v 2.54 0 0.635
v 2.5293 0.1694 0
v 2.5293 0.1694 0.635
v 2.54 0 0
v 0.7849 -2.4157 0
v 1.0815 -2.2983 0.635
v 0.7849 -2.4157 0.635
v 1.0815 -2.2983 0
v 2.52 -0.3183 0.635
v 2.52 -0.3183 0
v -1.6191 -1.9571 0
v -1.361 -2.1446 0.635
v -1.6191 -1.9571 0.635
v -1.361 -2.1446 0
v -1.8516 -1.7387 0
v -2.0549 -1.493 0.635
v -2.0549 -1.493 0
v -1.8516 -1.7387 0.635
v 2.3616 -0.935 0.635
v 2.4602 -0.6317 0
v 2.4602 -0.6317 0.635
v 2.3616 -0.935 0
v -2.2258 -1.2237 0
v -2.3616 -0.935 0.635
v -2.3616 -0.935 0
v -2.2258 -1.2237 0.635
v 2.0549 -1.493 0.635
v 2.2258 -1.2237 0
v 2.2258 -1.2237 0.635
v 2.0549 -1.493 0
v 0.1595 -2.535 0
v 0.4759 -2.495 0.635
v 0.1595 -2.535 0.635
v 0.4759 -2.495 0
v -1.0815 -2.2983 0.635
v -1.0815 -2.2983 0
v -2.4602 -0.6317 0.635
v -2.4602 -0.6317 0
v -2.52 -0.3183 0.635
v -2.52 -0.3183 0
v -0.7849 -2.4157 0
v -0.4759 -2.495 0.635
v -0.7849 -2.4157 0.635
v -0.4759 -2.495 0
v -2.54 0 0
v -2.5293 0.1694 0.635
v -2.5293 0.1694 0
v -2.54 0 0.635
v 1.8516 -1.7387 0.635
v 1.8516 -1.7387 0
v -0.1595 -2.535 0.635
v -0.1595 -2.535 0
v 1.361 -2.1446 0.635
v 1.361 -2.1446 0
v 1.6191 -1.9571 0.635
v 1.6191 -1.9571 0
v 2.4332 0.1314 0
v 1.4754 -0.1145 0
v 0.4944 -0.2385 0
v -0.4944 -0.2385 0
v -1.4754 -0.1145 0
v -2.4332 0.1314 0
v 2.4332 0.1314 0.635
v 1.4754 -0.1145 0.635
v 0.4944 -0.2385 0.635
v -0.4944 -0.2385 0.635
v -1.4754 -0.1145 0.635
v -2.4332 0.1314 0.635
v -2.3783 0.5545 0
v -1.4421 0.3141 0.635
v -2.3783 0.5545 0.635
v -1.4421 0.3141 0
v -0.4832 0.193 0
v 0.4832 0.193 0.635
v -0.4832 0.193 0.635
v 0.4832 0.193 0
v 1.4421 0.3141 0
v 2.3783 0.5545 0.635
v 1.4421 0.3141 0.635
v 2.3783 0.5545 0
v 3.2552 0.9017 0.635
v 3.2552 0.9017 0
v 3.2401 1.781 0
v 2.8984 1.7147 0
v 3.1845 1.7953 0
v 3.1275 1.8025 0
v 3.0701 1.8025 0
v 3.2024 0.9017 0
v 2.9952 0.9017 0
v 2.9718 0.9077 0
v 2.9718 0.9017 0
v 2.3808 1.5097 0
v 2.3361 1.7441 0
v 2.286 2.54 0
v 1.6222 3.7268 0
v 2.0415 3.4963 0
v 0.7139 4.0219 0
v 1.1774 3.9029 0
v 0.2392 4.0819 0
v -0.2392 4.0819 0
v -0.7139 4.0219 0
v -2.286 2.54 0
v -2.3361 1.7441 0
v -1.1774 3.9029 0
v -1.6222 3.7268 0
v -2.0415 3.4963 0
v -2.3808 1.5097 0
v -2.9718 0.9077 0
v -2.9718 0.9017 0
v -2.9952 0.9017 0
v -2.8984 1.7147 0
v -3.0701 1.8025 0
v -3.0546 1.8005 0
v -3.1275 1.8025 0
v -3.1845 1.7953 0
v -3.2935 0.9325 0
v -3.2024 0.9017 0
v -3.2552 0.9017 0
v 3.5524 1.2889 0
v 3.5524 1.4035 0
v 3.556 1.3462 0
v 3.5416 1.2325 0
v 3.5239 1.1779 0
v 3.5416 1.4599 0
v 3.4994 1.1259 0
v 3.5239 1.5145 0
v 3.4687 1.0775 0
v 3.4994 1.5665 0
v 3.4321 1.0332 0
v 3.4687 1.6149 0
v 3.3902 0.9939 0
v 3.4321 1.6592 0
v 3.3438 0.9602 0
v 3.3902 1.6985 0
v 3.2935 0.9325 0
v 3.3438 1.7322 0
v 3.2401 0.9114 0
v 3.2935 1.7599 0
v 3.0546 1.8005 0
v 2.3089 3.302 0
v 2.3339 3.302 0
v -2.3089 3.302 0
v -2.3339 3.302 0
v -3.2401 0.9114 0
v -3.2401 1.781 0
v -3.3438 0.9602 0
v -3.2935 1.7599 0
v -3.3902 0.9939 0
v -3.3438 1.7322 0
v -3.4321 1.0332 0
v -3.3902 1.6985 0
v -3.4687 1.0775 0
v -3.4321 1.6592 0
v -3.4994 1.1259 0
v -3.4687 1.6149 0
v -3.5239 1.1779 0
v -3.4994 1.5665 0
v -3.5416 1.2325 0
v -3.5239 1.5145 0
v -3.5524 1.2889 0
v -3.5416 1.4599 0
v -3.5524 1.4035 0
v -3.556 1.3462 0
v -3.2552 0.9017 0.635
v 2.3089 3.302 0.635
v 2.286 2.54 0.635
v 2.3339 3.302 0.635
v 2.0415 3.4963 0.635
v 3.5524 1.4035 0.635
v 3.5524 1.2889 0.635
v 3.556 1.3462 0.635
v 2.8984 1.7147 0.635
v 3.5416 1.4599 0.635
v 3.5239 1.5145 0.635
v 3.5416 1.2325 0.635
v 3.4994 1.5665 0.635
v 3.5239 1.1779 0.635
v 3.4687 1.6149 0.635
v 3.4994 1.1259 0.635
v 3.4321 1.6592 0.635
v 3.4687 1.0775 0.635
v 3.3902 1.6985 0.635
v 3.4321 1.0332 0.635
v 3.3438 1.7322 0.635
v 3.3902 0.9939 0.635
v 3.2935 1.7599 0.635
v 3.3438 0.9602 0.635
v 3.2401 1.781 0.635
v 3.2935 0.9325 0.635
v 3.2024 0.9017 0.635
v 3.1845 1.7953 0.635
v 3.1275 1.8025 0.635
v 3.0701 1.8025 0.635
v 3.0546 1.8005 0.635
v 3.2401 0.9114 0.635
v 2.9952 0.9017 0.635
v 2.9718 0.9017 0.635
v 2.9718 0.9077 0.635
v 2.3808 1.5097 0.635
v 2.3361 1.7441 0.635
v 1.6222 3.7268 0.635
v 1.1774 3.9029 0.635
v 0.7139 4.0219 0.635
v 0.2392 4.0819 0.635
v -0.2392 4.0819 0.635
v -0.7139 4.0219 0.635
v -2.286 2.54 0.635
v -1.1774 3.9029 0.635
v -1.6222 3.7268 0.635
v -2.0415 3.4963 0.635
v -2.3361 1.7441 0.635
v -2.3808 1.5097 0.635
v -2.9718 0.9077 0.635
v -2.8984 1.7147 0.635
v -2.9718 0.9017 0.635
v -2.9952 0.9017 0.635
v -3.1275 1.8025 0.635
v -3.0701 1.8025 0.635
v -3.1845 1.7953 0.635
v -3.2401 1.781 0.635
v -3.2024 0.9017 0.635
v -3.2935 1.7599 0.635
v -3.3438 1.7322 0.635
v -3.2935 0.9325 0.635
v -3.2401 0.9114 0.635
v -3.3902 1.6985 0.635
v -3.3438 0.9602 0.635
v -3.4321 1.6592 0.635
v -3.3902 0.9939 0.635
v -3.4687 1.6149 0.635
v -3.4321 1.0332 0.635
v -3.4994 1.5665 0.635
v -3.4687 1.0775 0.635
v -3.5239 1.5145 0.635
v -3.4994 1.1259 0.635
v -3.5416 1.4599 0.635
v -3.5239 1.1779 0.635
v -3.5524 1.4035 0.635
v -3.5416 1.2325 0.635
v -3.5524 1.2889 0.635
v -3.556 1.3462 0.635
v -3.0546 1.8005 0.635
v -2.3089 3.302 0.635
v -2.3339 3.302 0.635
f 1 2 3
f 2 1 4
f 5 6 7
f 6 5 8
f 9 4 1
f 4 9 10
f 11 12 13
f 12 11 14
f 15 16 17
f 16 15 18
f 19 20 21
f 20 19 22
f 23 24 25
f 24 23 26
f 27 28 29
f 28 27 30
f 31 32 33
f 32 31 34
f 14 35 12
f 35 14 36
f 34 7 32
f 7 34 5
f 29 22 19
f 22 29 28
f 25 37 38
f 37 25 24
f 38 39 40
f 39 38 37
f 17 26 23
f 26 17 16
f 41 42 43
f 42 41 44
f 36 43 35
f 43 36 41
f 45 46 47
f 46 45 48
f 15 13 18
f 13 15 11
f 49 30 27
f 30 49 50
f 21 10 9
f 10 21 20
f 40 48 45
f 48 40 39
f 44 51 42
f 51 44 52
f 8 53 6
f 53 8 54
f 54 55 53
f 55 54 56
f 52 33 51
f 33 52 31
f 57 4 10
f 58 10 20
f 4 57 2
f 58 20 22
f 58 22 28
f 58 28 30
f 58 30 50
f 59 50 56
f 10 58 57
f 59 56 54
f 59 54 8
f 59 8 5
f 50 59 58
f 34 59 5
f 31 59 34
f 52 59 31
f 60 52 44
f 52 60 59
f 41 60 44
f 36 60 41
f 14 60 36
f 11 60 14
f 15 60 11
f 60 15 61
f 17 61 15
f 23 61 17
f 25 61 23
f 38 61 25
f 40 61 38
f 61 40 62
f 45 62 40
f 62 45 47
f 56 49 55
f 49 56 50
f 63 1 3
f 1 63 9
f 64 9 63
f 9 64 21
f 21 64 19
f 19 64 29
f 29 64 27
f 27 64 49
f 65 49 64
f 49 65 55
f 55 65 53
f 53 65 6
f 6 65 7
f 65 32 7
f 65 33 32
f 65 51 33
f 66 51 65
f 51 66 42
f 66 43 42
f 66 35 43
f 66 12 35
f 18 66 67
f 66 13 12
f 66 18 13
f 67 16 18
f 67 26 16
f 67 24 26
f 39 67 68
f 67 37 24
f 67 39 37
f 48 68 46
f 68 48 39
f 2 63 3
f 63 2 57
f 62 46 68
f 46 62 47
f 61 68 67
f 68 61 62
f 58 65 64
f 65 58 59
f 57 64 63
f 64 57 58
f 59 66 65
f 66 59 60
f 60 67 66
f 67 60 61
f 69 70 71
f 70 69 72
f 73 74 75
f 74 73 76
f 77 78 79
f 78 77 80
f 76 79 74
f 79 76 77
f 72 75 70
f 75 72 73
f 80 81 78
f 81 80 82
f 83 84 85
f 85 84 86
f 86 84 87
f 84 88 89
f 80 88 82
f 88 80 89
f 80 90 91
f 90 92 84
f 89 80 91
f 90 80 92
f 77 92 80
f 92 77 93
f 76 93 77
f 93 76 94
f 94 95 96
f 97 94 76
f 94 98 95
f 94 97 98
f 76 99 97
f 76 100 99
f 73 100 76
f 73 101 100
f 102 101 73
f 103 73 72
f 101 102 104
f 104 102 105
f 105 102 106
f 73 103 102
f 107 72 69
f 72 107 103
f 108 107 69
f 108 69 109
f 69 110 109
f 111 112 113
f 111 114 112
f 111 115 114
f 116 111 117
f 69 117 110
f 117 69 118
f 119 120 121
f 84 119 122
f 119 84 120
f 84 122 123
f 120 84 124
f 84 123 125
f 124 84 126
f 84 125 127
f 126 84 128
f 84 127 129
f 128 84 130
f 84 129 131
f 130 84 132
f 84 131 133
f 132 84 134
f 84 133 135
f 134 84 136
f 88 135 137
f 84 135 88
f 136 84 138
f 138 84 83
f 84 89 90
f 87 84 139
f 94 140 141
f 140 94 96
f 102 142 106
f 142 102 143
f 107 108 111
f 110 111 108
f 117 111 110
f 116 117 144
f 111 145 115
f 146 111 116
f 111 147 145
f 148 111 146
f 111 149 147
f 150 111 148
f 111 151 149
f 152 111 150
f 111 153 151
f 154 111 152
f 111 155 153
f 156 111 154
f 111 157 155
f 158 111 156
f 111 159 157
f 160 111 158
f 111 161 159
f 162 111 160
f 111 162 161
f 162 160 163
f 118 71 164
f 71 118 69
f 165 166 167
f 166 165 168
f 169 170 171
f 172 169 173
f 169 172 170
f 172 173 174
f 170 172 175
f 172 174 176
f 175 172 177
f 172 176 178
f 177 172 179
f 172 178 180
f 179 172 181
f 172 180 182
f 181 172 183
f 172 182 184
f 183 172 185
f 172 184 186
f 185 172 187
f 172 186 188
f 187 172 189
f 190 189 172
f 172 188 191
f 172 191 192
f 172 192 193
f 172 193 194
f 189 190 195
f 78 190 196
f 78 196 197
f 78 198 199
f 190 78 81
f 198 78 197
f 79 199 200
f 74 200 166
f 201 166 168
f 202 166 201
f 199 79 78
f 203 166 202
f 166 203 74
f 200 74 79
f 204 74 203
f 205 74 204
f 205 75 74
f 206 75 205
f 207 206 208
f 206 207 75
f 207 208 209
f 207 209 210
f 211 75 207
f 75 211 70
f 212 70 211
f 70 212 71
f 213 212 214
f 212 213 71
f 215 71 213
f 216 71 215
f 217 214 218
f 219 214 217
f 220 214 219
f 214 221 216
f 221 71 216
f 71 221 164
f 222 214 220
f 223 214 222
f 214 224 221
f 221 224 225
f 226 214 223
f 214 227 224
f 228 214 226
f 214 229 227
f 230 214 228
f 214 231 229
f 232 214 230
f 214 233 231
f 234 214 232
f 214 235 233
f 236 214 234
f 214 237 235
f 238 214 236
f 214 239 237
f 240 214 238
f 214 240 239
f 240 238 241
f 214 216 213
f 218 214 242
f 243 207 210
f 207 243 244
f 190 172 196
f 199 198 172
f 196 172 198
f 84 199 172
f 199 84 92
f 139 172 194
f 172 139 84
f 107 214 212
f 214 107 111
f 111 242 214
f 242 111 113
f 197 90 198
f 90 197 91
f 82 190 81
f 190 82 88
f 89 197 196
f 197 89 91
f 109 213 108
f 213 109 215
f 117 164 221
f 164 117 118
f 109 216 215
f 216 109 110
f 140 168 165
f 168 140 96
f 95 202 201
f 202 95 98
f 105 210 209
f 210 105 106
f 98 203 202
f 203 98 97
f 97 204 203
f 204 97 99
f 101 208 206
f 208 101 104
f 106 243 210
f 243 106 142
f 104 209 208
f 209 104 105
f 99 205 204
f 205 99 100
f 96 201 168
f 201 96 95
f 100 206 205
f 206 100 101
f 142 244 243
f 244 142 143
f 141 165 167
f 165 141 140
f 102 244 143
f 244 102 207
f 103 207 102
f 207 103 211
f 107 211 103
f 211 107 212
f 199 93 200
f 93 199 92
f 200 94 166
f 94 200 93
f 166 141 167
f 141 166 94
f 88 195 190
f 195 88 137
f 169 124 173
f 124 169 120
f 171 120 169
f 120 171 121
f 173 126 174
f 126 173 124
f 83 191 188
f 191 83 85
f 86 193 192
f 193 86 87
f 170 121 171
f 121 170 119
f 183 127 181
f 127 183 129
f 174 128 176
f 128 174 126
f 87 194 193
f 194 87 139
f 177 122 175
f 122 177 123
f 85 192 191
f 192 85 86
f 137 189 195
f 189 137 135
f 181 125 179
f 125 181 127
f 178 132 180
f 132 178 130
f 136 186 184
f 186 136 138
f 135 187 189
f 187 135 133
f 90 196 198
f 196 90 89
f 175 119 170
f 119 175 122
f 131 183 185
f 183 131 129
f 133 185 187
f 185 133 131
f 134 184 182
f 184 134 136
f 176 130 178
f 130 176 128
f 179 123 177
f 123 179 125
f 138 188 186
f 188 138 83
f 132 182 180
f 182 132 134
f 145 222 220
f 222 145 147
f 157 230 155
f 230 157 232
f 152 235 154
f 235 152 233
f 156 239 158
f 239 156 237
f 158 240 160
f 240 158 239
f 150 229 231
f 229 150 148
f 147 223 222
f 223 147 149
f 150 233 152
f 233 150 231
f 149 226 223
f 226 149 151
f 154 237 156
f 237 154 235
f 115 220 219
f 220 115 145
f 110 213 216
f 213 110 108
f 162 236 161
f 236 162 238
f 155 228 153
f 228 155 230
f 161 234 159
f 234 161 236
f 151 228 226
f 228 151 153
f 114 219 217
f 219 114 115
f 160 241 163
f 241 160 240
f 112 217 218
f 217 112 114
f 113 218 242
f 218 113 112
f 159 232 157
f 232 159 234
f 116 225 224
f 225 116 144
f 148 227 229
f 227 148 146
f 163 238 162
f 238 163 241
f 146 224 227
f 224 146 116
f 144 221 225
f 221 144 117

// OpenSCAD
//you can change the mm value to change the scale of hatguy (using the actual value, 25.4, makes him about 2.5 inches wide, using 2.54 makes it .25 inches wide, etc)

function mm(i) = i*2.54;

$fn=50;



module hatguy()
{
	union()
	{
		difference()
		{
			union()
			{
				difference()
				{
					cylinder(mm(.25), mm(1), mm(1), 0);
					translate([0, mm(3), -1])
					{
						cylinder(mm(.25)+2, mm(3.1), mm(3.1), 0);
					}
			
				}
			
				difference()
				{
					translate([0, mm(3.1), 0])
						{
							cylinder(mm(.25), mm(3.03), mm(3.03), 0);
						}
					translate([0, mm(3.1), -1])
						{
							cylinder(mm(.25)+2, mm(2.68), mm(2.68), 0);
						}
					translate([-mm(4),mm(.7),-1])
						{
							cube([mm(8), mm(8), mm(.25)+2]);	
						}
					translate([mm(1.17),mm(.355),-1])
						{
							cube([mm(.7), mm(.7), mm(.25)+2]);
						}
					translate([-mm(1.87),mm(.355),-1])
						{	
							cube([mm(.7), mm(.7), mm(.25)+2]);
						}
				}

				difference()
					{
					union()
					{
						translate([-mm(1),mm(.3),0])
							{
							cube([mm(2), mm(1), mm(.25)]);
							}
						translate([0,mm(.11),0])
							{
								difference()
								{
									cylinder(mm(.25), mm(1.5), mm(1.5));
									translate([-mm(2), -mm(3), -1])
									{
										cube([mm(4), mm(4), mm(.25)+2]);
									}
								}
							}
					}


					translate([-mm(3.4),mm(1),-1])
						{
							cylinder(mm(.25)+2, mm(2.5), mm(2.5), 0);
						}
					translate([mm(3.4),mm(1),-1])
						{
							cylinder(mm(.25)+2, mm(2.5), mm(2.5), 0);
						}
					}

			difference()
				{
			translate([mm(1.22),mm(.53),0])
						{
							cylinder(mm(.25), mm(.18), mm(.18), 0);
						}		
			translate([0, mm(3.1), -1])
						{
							cylinder(mm(.25)+2, mm(2.68), mm(2.68), 0);
						}
				}
		
		difference()
				{
			translate([-mm(1.22),mm(.53),0])
					{
						cylinder(mm(.25), mm(.18), mm(.18), 0);
					}	
			translate([0, mm(3.1), -1])
					{
						cylinder(mm(.25)+2, mm(2.68), mm(2.68), 0);
					}
			}
	}
}
	


			
	}
}

hatguy();
